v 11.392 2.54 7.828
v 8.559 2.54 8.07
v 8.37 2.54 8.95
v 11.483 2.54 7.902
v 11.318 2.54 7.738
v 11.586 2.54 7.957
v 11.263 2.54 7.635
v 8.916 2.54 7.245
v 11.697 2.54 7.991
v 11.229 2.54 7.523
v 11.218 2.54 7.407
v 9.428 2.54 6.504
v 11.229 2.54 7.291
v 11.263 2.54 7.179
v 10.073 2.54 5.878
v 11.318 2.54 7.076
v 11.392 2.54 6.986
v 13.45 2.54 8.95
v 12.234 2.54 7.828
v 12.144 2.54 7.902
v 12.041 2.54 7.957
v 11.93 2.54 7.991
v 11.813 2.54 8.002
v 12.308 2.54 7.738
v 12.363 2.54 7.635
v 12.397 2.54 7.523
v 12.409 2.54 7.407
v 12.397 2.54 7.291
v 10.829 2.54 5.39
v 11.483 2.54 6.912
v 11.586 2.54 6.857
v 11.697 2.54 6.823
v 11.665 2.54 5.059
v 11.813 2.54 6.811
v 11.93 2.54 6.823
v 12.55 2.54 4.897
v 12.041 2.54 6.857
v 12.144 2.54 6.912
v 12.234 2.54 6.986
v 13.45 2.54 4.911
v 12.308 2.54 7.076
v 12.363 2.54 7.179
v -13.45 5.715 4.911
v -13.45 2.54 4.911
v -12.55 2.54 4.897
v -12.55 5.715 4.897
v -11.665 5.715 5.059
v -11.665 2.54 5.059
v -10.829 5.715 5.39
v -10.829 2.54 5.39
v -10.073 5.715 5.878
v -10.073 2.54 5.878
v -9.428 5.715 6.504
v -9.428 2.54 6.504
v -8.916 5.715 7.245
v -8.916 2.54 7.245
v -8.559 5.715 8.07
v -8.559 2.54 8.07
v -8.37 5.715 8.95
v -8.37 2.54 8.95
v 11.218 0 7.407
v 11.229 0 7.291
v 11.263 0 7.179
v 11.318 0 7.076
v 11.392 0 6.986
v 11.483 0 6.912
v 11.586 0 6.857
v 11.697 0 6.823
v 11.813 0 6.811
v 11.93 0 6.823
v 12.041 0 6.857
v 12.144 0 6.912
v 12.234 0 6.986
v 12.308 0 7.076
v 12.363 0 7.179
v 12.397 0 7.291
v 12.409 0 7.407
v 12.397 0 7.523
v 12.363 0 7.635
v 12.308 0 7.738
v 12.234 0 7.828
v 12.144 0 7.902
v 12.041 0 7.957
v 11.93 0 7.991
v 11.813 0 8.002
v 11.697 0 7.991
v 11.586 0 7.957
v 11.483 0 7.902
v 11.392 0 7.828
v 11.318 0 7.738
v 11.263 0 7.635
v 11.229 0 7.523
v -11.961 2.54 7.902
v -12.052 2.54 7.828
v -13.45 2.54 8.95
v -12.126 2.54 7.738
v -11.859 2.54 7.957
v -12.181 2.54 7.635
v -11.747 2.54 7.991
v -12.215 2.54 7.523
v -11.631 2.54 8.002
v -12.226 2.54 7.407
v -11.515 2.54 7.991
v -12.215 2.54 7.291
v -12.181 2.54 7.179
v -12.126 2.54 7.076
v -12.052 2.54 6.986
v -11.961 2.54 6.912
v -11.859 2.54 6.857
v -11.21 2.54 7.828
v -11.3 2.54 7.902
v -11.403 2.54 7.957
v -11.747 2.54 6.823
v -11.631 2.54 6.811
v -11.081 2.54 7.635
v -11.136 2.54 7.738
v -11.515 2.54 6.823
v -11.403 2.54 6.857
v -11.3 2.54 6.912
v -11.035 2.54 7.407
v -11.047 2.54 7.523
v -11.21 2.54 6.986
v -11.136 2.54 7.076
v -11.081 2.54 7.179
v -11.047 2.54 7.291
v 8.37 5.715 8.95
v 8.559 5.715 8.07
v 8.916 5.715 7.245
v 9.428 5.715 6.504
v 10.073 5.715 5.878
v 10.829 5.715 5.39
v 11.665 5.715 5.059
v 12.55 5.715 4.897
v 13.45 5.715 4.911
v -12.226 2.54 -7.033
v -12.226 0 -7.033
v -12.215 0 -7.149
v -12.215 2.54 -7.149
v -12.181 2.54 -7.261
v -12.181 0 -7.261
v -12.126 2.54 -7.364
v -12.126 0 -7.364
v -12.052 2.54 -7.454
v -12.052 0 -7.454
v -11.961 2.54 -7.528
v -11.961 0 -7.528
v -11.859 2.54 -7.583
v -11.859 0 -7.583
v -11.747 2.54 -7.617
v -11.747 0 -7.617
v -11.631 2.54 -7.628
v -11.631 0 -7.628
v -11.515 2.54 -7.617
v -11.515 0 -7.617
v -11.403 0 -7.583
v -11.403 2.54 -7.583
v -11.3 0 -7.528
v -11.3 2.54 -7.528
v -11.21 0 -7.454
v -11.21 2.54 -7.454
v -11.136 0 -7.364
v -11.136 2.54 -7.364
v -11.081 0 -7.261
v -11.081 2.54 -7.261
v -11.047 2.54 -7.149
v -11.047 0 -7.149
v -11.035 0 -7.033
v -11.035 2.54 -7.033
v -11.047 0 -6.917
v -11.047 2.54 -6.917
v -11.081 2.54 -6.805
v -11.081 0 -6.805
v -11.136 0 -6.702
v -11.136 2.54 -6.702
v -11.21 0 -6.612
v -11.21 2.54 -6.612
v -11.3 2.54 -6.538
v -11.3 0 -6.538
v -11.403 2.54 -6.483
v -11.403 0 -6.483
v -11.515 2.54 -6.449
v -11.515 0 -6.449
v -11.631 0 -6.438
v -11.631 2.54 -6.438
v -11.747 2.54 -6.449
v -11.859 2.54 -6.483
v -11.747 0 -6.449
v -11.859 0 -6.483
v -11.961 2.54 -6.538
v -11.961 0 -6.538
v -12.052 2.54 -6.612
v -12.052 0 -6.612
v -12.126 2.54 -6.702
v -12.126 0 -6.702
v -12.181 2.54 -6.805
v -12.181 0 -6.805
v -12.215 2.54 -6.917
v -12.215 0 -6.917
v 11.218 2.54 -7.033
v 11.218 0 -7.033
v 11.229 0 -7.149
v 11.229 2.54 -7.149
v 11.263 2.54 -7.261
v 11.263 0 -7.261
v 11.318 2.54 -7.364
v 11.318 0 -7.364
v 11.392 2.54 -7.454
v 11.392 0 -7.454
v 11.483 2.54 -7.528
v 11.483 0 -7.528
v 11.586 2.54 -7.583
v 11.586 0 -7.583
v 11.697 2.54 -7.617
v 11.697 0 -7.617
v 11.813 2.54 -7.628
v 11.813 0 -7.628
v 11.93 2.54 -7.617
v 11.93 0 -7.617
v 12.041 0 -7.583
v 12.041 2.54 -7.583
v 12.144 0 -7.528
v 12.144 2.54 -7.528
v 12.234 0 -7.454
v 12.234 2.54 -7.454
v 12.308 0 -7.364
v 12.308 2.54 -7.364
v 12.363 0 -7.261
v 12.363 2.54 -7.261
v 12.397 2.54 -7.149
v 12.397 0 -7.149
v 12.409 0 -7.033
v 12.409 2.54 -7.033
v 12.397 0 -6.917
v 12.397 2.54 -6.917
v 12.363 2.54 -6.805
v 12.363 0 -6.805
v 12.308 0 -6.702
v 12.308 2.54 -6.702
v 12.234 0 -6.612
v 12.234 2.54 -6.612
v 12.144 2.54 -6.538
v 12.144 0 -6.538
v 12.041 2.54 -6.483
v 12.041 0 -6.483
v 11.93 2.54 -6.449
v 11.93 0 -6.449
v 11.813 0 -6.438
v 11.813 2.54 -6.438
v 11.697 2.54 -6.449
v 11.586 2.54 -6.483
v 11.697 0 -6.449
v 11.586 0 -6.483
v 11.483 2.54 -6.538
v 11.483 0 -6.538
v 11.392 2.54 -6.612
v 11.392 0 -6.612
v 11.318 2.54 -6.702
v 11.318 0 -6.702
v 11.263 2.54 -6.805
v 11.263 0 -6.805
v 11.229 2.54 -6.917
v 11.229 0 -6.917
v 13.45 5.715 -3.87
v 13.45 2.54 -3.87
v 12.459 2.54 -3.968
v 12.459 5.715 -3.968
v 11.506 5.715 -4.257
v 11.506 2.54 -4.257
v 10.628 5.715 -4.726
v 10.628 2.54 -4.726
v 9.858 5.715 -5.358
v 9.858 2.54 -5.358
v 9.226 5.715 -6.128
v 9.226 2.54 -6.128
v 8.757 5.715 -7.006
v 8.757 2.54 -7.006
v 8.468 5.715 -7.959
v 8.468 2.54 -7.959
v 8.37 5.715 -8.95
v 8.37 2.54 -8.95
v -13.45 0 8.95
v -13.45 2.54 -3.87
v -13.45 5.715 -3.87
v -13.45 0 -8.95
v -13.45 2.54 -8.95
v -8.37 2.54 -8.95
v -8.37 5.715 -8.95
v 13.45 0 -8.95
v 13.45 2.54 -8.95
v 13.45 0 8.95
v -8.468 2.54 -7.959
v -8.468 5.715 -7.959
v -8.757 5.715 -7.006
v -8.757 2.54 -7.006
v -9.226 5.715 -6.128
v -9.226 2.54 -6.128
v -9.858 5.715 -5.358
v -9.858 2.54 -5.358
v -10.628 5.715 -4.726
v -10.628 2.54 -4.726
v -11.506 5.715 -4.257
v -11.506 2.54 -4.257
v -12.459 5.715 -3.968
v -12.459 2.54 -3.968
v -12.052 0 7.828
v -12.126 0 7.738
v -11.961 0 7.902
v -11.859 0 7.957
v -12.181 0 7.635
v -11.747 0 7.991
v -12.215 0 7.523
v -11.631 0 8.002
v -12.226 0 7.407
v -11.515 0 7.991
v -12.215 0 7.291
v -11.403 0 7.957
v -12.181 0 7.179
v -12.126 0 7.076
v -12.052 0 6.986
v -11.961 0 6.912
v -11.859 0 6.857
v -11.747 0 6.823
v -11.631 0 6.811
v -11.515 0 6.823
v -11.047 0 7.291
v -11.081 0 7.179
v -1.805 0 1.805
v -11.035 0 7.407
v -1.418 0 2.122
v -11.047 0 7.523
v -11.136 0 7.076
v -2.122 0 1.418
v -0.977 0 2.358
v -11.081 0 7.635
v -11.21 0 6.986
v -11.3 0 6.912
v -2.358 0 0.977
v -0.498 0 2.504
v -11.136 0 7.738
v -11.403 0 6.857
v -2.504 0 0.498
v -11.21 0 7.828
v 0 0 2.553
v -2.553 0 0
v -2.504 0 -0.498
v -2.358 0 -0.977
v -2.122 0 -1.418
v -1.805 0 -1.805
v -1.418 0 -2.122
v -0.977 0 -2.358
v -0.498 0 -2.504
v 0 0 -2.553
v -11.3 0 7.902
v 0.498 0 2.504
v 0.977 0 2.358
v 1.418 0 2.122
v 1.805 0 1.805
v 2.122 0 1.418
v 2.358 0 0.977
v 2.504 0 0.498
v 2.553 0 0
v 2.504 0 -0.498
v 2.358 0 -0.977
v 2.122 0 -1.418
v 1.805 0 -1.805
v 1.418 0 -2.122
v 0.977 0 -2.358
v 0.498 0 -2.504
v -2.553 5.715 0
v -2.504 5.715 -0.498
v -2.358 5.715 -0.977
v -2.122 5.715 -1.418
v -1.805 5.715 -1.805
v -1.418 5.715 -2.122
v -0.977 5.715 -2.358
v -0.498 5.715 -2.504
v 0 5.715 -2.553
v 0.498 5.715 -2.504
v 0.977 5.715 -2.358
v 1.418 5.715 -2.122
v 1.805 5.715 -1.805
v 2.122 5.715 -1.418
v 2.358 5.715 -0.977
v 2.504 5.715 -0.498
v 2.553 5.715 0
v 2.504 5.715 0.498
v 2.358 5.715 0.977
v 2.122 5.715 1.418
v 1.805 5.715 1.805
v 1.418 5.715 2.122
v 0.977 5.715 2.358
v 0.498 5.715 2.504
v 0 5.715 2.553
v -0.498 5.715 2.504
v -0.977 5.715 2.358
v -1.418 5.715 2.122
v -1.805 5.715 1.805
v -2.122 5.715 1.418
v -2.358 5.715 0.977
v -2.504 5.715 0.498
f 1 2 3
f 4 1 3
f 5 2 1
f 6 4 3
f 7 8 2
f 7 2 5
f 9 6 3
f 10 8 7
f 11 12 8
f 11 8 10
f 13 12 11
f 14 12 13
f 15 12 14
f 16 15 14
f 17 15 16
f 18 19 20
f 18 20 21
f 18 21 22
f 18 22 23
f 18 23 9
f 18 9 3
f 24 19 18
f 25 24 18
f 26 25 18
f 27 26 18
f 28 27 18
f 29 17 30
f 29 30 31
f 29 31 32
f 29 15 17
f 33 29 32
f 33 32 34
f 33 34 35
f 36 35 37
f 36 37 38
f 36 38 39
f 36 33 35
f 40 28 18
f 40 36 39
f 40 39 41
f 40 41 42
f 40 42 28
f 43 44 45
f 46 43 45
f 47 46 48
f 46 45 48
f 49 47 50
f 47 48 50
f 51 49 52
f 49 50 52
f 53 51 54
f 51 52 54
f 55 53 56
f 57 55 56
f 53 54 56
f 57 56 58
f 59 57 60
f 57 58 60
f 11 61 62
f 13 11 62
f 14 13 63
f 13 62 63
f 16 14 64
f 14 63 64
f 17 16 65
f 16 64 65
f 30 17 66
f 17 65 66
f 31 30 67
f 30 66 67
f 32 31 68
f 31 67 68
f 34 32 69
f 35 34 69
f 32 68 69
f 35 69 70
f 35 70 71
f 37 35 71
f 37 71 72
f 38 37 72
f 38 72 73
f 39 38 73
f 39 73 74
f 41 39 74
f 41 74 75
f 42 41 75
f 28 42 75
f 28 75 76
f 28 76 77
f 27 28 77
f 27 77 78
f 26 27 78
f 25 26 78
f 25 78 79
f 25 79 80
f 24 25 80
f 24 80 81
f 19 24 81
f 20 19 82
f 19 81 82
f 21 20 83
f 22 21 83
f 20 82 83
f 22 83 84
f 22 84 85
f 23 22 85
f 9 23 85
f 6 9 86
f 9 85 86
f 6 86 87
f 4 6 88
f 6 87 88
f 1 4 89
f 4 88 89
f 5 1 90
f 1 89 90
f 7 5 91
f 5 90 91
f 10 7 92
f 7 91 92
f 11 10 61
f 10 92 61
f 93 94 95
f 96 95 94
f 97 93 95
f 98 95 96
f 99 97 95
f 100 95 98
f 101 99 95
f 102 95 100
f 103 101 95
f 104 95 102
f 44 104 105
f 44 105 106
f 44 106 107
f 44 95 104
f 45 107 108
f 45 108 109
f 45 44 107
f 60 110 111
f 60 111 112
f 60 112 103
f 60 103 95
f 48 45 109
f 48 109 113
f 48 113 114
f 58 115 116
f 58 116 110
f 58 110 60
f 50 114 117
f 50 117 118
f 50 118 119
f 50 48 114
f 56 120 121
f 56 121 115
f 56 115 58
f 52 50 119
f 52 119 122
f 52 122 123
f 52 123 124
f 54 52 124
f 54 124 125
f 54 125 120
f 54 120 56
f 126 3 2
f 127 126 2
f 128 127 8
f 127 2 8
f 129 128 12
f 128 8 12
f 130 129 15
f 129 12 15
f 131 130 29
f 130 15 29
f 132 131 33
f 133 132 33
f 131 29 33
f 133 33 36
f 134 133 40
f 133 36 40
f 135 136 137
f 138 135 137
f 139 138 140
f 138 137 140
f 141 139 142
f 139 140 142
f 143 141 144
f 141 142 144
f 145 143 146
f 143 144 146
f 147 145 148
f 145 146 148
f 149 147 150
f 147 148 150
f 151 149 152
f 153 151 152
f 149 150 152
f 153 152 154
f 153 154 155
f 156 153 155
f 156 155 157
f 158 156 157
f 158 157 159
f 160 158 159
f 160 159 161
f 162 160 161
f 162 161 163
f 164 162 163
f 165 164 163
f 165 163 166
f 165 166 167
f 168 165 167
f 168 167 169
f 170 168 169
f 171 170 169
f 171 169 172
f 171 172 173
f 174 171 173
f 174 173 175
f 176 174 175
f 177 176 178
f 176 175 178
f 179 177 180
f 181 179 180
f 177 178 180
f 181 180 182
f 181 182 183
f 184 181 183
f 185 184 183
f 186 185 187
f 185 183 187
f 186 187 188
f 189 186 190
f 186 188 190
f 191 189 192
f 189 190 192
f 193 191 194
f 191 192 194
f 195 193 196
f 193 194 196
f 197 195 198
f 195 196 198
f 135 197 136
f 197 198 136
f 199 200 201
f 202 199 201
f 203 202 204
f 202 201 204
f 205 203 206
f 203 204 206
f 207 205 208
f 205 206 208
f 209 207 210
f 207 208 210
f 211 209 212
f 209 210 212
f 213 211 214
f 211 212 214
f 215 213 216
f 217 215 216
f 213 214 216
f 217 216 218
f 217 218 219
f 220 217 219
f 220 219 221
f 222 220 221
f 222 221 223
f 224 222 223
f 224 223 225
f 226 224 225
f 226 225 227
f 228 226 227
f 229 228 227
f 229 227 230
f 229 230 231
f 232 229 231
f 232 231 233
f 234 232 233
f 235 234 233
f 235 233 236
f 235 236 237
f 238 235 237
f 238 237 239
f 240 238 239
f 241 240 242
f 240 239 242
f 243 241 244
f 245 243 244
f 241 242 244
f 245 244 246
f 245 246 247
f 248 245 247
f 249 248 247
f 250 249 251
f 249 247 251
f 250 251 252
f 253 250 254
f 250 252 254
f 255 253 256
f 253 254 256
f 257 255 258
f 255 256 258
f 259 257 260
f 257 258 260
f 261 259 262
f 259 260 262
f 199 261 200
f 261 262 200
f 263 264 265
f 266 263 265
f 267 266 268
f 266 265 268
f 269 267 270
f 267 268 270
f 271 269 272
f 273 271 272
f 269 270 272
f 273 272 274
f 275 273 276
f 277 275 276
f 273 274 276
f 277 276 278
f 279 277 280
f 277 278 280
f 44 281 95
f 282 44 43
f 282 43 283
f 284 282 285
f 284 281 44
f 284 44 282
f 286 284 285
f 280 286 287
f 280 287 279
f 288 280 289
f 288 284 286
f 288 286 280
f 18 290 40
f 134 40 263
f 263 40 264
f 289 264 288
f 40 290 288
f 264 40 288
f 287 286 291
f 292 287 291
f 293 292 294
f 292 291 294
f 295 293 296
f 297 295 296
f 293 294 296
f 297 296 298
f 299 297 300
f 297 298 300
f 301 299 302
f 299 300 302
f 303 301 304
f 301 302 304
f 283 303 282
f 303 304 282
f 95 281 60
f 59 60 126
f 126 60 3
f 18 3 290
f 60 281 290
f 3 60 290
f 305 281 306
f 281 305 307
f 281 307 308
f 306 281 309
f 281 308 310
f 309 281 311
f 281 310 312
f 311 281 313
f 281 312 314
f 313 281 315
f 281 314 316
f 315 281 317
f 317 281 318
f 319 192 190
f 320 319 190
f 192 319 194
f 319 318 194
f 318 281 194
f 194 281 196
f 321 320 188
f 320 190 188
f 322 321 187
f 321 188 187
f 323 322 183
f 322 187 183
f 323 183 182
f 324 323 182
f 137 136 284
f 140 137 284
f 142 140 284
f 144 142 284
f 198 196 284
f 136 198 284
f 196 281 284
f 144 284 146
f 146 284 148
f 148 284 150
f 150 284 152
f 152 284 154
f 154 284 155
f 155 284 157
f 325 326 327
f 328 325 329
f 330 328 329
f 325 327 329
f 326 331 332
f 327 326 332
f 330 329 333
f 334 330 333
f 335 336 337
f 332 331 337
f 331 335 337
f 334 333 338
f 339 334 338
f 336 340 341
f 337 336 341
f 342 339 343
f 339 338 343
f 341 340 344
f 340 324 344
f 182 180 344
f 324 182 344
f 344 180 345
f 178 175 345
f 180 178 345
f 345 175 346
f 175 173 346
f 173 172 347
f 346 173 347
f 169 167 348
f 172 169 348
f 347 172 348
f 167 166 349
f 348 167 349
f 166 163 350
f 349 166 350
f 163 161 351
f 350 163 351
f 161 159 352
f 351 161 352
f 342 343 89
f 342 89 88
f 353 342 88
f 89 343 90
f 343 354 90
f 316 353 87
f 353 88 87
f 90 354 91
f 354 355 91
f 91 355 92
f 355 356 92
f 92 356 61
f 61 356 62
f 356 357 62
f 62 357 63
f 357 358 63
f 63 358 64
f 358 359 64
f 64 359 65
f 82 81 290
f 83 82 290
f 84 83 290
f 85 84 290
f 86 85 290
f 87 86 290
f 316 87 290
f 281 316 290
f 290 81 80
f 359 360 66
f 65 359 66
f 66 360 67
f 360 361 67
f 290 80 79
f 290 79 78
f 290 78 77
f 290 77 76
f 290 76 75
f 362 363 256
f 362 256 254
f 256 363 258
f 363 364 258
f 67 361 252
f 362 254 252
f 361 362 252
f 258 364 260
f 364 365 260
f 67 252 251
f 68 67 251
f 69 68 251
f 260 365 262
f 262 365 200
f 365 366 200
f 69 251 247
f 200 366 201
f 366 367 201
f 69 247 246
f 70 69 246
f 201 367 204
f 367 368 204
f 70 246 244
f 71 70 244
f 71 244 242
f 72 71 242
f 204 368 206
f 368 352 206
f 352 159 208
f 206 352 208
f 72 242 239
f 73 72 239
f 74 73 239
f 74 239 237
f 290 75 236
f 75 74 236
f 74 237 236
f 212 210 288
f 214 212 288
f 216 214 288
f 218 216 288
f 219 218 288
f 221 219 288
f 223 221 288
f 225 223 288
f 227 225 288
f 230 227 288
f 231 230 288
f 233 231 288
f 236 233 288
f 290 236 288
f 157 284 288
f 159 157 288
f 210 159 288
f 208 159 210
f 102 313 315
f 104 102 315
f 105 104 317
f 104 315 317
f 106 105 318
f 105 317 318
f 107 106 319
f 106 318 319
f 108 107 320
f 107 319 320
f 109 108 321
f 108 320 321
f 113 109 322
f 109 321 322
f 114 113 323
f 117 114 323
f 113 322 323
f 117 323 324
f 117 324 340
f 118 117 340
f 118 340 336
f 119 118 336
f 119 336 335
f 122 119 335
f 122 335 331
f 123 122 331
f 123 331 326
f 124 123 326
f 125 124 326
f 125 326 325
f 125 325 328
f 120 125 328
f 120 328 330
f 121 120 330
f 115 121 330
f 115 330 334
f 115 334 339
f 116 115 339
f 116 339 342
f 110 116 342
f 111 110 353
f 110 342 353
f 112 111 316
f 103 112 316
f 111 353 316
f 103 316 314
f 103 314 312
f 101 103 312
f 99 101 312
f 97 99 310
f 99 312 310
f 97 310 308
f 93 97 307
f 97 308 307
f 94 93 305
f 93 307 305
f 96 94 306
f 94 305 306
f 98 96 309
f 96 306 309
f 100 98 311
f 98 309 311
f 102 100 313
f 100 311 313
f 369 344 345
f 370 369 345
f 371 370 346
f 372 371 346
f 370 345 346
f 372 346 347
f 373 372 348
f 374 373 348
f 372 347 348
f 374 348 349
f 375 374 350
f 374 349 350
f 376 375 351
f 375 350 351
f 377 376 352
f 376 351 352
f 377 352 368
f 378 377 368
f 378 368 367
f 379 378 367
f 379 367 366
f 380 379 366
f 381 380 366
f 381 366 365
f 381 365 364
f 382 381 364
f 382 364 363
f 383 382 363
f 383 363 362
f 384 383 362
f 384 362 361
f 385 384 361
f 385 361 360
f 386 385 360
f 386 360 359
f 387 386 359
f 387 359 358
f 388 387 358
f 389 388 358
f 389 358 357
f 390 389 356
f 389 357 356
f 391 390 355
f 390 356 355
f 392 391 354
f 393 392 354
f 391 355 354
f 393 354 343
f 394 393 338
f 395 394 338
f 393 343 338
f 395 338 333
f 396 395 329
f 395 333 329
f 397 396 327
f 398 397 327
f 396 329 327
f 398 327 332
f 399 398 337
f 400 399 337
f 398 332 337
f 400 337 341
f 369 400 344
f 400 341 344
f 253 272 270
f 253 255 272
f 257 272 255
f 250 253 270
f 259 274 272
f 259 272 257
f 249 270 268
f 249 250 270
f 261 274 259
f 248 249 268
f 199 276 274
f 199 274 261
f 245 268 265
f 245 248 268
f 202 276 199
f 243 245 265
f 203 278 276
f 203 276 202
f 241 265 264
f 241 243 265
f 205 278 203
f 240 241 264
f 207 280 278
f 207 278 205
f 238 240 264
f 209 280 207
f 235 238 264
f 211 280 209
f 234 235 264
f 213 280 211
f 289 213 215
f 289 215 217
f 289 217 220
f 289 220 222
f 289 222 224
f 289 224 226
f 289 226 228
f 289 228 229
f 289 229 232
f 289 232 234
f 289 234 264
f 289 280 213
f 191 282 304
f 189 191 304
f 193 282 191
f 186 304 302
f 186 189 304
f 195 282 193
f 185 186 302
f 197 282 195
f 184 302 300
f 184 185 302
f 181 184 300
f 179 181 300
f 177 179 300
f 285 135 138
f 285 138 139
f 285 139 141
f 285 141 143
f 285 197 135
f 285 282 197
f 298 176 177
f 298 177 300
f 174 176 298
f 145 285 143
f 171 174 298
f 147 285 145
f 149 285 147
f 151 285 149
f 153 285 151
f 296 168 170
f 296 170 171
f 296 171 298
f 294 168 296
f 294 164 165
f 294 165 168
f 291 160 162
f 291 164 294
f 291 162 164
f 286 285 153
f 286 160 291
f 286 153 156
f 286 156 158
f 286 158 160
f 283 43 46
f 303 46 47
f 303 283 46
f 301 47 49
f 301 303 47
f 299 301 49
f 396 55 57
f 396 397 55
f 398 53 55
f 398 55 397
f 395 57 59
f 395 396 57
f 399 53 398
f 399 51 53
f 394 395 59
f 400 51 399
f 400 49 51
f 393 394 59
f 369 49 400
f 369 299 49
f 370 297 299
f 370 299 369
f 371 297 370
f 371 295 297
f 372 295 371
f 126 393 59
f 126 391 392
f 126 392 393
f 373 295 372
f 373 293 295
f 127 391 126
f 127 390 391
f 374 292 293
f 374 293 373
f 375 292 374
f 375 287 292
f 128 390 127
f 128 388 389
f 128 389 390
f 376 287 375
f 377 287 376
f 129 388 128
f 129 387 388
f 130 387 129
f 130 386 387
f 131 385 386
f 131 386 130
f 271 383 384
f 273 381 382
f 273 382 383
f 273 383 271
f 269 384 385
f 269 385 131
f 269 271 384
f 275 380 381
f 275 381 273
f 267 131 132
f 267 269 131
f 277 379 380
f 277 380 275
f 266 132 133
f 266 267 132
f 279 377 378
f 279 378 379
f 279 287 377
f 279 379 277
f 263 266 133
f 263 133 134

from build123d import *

# Parameters (mm, degrees)
SKETCH1_W                           = 26.9
SKETCH1_H                           = 17.9
BOSS_EXTRUDE1_DEPTH                 = 2.54
BOSS_EXTRUDE2_DEPTH                 = 3.175
F_1_4_20_TAPPED_HOLE1_D             = 5.1054
F_1_4_20_TAPPED_HOLE1_DEPTH         = 5.715
F_3_64_0_04688_DIAMETER_HOLE1_D     = 1.190752
F_3_64_0_04688_DIAMETER_HOLE1_DEPTH = 2.54


with BuildPart() as part:
    # Sketch1 → Boss-Extrude1 (new body)
    with BuildSketch(Plane(origin=(0, 0, 0), x_dir=(1, 0, 0), z_dir=(0, 1, 0))):
        Rectangle(SKETCH1_W, SKETCH1_H)
    extrude(amount=BOSS_EXTRUDE1_DEPTH)

    # Sketch2 → Boss-Extrude2 (add)
    with BuildSketch(Plane(origin=(0, 2.54, 0), x_dir=(1, 0, 0), z_dir=(0, 1, 0))):
        with BuildLine():
            Line((-8.37, -8.95), (8.37, -8.95))
            ThreePointArc((8.37, -8.95), (10.073421181, -5.878217622), (13.45, -4.910640141))
            Line((13.45, -4.910640141), (13.45, 3.87))
            ThreePointArc((13.45, 3.87), (9.857897552, 5.357897552), (8.37, 8.95))
            Line((8.37, 8.95), (-8.37, 8.95))
            ThreePointArc((-8.37, 8.95), (-9.857897552, 5.357897552), (-13.45, 3.87))
            Line((-13.45, 3.87), (-13.45, -4.910640141))
            ThreePointArc((-13.45, -4.910640141), (-10.073421181, -5.878217622), (-8.37, -8.95))
        make_face()
    extrude(amount=BOSS_EXTRUDE2_DEPTH)

    # 1/4-20 Tapped Hole1
    with Locations(Plane(origin=(0, 5.715, 0), x_dir=(1, 0, 0), z_dir=(0, 1, 0))):
        with Locations((0, 0)):
            Hole(F_1_4_20_TAPPED_HOLE1_D / 2, depth=F_1_4_20_TAPPED_HOLE1_DEPTH)

    # 3/64 (0.04688) Diameter Hole1
    with Locations(Plane(origin=(0, 2.54, 0), x_dir=(1, 0, 0), z_dir=(0, 1, 0))):
        with Locations((-11.630674377, 7.033069438), (-11.630674377, -7.406874263), (11.813402436, -7.406874263), (11.813402436, 7.033069438)):
            Hole(F_3_64_0_04688_DIAMETER_HOLE1_D / 2, depth=F_3_64_0_04688_DIAMETER_HOLE1_DEPTH)


solid = part.part
